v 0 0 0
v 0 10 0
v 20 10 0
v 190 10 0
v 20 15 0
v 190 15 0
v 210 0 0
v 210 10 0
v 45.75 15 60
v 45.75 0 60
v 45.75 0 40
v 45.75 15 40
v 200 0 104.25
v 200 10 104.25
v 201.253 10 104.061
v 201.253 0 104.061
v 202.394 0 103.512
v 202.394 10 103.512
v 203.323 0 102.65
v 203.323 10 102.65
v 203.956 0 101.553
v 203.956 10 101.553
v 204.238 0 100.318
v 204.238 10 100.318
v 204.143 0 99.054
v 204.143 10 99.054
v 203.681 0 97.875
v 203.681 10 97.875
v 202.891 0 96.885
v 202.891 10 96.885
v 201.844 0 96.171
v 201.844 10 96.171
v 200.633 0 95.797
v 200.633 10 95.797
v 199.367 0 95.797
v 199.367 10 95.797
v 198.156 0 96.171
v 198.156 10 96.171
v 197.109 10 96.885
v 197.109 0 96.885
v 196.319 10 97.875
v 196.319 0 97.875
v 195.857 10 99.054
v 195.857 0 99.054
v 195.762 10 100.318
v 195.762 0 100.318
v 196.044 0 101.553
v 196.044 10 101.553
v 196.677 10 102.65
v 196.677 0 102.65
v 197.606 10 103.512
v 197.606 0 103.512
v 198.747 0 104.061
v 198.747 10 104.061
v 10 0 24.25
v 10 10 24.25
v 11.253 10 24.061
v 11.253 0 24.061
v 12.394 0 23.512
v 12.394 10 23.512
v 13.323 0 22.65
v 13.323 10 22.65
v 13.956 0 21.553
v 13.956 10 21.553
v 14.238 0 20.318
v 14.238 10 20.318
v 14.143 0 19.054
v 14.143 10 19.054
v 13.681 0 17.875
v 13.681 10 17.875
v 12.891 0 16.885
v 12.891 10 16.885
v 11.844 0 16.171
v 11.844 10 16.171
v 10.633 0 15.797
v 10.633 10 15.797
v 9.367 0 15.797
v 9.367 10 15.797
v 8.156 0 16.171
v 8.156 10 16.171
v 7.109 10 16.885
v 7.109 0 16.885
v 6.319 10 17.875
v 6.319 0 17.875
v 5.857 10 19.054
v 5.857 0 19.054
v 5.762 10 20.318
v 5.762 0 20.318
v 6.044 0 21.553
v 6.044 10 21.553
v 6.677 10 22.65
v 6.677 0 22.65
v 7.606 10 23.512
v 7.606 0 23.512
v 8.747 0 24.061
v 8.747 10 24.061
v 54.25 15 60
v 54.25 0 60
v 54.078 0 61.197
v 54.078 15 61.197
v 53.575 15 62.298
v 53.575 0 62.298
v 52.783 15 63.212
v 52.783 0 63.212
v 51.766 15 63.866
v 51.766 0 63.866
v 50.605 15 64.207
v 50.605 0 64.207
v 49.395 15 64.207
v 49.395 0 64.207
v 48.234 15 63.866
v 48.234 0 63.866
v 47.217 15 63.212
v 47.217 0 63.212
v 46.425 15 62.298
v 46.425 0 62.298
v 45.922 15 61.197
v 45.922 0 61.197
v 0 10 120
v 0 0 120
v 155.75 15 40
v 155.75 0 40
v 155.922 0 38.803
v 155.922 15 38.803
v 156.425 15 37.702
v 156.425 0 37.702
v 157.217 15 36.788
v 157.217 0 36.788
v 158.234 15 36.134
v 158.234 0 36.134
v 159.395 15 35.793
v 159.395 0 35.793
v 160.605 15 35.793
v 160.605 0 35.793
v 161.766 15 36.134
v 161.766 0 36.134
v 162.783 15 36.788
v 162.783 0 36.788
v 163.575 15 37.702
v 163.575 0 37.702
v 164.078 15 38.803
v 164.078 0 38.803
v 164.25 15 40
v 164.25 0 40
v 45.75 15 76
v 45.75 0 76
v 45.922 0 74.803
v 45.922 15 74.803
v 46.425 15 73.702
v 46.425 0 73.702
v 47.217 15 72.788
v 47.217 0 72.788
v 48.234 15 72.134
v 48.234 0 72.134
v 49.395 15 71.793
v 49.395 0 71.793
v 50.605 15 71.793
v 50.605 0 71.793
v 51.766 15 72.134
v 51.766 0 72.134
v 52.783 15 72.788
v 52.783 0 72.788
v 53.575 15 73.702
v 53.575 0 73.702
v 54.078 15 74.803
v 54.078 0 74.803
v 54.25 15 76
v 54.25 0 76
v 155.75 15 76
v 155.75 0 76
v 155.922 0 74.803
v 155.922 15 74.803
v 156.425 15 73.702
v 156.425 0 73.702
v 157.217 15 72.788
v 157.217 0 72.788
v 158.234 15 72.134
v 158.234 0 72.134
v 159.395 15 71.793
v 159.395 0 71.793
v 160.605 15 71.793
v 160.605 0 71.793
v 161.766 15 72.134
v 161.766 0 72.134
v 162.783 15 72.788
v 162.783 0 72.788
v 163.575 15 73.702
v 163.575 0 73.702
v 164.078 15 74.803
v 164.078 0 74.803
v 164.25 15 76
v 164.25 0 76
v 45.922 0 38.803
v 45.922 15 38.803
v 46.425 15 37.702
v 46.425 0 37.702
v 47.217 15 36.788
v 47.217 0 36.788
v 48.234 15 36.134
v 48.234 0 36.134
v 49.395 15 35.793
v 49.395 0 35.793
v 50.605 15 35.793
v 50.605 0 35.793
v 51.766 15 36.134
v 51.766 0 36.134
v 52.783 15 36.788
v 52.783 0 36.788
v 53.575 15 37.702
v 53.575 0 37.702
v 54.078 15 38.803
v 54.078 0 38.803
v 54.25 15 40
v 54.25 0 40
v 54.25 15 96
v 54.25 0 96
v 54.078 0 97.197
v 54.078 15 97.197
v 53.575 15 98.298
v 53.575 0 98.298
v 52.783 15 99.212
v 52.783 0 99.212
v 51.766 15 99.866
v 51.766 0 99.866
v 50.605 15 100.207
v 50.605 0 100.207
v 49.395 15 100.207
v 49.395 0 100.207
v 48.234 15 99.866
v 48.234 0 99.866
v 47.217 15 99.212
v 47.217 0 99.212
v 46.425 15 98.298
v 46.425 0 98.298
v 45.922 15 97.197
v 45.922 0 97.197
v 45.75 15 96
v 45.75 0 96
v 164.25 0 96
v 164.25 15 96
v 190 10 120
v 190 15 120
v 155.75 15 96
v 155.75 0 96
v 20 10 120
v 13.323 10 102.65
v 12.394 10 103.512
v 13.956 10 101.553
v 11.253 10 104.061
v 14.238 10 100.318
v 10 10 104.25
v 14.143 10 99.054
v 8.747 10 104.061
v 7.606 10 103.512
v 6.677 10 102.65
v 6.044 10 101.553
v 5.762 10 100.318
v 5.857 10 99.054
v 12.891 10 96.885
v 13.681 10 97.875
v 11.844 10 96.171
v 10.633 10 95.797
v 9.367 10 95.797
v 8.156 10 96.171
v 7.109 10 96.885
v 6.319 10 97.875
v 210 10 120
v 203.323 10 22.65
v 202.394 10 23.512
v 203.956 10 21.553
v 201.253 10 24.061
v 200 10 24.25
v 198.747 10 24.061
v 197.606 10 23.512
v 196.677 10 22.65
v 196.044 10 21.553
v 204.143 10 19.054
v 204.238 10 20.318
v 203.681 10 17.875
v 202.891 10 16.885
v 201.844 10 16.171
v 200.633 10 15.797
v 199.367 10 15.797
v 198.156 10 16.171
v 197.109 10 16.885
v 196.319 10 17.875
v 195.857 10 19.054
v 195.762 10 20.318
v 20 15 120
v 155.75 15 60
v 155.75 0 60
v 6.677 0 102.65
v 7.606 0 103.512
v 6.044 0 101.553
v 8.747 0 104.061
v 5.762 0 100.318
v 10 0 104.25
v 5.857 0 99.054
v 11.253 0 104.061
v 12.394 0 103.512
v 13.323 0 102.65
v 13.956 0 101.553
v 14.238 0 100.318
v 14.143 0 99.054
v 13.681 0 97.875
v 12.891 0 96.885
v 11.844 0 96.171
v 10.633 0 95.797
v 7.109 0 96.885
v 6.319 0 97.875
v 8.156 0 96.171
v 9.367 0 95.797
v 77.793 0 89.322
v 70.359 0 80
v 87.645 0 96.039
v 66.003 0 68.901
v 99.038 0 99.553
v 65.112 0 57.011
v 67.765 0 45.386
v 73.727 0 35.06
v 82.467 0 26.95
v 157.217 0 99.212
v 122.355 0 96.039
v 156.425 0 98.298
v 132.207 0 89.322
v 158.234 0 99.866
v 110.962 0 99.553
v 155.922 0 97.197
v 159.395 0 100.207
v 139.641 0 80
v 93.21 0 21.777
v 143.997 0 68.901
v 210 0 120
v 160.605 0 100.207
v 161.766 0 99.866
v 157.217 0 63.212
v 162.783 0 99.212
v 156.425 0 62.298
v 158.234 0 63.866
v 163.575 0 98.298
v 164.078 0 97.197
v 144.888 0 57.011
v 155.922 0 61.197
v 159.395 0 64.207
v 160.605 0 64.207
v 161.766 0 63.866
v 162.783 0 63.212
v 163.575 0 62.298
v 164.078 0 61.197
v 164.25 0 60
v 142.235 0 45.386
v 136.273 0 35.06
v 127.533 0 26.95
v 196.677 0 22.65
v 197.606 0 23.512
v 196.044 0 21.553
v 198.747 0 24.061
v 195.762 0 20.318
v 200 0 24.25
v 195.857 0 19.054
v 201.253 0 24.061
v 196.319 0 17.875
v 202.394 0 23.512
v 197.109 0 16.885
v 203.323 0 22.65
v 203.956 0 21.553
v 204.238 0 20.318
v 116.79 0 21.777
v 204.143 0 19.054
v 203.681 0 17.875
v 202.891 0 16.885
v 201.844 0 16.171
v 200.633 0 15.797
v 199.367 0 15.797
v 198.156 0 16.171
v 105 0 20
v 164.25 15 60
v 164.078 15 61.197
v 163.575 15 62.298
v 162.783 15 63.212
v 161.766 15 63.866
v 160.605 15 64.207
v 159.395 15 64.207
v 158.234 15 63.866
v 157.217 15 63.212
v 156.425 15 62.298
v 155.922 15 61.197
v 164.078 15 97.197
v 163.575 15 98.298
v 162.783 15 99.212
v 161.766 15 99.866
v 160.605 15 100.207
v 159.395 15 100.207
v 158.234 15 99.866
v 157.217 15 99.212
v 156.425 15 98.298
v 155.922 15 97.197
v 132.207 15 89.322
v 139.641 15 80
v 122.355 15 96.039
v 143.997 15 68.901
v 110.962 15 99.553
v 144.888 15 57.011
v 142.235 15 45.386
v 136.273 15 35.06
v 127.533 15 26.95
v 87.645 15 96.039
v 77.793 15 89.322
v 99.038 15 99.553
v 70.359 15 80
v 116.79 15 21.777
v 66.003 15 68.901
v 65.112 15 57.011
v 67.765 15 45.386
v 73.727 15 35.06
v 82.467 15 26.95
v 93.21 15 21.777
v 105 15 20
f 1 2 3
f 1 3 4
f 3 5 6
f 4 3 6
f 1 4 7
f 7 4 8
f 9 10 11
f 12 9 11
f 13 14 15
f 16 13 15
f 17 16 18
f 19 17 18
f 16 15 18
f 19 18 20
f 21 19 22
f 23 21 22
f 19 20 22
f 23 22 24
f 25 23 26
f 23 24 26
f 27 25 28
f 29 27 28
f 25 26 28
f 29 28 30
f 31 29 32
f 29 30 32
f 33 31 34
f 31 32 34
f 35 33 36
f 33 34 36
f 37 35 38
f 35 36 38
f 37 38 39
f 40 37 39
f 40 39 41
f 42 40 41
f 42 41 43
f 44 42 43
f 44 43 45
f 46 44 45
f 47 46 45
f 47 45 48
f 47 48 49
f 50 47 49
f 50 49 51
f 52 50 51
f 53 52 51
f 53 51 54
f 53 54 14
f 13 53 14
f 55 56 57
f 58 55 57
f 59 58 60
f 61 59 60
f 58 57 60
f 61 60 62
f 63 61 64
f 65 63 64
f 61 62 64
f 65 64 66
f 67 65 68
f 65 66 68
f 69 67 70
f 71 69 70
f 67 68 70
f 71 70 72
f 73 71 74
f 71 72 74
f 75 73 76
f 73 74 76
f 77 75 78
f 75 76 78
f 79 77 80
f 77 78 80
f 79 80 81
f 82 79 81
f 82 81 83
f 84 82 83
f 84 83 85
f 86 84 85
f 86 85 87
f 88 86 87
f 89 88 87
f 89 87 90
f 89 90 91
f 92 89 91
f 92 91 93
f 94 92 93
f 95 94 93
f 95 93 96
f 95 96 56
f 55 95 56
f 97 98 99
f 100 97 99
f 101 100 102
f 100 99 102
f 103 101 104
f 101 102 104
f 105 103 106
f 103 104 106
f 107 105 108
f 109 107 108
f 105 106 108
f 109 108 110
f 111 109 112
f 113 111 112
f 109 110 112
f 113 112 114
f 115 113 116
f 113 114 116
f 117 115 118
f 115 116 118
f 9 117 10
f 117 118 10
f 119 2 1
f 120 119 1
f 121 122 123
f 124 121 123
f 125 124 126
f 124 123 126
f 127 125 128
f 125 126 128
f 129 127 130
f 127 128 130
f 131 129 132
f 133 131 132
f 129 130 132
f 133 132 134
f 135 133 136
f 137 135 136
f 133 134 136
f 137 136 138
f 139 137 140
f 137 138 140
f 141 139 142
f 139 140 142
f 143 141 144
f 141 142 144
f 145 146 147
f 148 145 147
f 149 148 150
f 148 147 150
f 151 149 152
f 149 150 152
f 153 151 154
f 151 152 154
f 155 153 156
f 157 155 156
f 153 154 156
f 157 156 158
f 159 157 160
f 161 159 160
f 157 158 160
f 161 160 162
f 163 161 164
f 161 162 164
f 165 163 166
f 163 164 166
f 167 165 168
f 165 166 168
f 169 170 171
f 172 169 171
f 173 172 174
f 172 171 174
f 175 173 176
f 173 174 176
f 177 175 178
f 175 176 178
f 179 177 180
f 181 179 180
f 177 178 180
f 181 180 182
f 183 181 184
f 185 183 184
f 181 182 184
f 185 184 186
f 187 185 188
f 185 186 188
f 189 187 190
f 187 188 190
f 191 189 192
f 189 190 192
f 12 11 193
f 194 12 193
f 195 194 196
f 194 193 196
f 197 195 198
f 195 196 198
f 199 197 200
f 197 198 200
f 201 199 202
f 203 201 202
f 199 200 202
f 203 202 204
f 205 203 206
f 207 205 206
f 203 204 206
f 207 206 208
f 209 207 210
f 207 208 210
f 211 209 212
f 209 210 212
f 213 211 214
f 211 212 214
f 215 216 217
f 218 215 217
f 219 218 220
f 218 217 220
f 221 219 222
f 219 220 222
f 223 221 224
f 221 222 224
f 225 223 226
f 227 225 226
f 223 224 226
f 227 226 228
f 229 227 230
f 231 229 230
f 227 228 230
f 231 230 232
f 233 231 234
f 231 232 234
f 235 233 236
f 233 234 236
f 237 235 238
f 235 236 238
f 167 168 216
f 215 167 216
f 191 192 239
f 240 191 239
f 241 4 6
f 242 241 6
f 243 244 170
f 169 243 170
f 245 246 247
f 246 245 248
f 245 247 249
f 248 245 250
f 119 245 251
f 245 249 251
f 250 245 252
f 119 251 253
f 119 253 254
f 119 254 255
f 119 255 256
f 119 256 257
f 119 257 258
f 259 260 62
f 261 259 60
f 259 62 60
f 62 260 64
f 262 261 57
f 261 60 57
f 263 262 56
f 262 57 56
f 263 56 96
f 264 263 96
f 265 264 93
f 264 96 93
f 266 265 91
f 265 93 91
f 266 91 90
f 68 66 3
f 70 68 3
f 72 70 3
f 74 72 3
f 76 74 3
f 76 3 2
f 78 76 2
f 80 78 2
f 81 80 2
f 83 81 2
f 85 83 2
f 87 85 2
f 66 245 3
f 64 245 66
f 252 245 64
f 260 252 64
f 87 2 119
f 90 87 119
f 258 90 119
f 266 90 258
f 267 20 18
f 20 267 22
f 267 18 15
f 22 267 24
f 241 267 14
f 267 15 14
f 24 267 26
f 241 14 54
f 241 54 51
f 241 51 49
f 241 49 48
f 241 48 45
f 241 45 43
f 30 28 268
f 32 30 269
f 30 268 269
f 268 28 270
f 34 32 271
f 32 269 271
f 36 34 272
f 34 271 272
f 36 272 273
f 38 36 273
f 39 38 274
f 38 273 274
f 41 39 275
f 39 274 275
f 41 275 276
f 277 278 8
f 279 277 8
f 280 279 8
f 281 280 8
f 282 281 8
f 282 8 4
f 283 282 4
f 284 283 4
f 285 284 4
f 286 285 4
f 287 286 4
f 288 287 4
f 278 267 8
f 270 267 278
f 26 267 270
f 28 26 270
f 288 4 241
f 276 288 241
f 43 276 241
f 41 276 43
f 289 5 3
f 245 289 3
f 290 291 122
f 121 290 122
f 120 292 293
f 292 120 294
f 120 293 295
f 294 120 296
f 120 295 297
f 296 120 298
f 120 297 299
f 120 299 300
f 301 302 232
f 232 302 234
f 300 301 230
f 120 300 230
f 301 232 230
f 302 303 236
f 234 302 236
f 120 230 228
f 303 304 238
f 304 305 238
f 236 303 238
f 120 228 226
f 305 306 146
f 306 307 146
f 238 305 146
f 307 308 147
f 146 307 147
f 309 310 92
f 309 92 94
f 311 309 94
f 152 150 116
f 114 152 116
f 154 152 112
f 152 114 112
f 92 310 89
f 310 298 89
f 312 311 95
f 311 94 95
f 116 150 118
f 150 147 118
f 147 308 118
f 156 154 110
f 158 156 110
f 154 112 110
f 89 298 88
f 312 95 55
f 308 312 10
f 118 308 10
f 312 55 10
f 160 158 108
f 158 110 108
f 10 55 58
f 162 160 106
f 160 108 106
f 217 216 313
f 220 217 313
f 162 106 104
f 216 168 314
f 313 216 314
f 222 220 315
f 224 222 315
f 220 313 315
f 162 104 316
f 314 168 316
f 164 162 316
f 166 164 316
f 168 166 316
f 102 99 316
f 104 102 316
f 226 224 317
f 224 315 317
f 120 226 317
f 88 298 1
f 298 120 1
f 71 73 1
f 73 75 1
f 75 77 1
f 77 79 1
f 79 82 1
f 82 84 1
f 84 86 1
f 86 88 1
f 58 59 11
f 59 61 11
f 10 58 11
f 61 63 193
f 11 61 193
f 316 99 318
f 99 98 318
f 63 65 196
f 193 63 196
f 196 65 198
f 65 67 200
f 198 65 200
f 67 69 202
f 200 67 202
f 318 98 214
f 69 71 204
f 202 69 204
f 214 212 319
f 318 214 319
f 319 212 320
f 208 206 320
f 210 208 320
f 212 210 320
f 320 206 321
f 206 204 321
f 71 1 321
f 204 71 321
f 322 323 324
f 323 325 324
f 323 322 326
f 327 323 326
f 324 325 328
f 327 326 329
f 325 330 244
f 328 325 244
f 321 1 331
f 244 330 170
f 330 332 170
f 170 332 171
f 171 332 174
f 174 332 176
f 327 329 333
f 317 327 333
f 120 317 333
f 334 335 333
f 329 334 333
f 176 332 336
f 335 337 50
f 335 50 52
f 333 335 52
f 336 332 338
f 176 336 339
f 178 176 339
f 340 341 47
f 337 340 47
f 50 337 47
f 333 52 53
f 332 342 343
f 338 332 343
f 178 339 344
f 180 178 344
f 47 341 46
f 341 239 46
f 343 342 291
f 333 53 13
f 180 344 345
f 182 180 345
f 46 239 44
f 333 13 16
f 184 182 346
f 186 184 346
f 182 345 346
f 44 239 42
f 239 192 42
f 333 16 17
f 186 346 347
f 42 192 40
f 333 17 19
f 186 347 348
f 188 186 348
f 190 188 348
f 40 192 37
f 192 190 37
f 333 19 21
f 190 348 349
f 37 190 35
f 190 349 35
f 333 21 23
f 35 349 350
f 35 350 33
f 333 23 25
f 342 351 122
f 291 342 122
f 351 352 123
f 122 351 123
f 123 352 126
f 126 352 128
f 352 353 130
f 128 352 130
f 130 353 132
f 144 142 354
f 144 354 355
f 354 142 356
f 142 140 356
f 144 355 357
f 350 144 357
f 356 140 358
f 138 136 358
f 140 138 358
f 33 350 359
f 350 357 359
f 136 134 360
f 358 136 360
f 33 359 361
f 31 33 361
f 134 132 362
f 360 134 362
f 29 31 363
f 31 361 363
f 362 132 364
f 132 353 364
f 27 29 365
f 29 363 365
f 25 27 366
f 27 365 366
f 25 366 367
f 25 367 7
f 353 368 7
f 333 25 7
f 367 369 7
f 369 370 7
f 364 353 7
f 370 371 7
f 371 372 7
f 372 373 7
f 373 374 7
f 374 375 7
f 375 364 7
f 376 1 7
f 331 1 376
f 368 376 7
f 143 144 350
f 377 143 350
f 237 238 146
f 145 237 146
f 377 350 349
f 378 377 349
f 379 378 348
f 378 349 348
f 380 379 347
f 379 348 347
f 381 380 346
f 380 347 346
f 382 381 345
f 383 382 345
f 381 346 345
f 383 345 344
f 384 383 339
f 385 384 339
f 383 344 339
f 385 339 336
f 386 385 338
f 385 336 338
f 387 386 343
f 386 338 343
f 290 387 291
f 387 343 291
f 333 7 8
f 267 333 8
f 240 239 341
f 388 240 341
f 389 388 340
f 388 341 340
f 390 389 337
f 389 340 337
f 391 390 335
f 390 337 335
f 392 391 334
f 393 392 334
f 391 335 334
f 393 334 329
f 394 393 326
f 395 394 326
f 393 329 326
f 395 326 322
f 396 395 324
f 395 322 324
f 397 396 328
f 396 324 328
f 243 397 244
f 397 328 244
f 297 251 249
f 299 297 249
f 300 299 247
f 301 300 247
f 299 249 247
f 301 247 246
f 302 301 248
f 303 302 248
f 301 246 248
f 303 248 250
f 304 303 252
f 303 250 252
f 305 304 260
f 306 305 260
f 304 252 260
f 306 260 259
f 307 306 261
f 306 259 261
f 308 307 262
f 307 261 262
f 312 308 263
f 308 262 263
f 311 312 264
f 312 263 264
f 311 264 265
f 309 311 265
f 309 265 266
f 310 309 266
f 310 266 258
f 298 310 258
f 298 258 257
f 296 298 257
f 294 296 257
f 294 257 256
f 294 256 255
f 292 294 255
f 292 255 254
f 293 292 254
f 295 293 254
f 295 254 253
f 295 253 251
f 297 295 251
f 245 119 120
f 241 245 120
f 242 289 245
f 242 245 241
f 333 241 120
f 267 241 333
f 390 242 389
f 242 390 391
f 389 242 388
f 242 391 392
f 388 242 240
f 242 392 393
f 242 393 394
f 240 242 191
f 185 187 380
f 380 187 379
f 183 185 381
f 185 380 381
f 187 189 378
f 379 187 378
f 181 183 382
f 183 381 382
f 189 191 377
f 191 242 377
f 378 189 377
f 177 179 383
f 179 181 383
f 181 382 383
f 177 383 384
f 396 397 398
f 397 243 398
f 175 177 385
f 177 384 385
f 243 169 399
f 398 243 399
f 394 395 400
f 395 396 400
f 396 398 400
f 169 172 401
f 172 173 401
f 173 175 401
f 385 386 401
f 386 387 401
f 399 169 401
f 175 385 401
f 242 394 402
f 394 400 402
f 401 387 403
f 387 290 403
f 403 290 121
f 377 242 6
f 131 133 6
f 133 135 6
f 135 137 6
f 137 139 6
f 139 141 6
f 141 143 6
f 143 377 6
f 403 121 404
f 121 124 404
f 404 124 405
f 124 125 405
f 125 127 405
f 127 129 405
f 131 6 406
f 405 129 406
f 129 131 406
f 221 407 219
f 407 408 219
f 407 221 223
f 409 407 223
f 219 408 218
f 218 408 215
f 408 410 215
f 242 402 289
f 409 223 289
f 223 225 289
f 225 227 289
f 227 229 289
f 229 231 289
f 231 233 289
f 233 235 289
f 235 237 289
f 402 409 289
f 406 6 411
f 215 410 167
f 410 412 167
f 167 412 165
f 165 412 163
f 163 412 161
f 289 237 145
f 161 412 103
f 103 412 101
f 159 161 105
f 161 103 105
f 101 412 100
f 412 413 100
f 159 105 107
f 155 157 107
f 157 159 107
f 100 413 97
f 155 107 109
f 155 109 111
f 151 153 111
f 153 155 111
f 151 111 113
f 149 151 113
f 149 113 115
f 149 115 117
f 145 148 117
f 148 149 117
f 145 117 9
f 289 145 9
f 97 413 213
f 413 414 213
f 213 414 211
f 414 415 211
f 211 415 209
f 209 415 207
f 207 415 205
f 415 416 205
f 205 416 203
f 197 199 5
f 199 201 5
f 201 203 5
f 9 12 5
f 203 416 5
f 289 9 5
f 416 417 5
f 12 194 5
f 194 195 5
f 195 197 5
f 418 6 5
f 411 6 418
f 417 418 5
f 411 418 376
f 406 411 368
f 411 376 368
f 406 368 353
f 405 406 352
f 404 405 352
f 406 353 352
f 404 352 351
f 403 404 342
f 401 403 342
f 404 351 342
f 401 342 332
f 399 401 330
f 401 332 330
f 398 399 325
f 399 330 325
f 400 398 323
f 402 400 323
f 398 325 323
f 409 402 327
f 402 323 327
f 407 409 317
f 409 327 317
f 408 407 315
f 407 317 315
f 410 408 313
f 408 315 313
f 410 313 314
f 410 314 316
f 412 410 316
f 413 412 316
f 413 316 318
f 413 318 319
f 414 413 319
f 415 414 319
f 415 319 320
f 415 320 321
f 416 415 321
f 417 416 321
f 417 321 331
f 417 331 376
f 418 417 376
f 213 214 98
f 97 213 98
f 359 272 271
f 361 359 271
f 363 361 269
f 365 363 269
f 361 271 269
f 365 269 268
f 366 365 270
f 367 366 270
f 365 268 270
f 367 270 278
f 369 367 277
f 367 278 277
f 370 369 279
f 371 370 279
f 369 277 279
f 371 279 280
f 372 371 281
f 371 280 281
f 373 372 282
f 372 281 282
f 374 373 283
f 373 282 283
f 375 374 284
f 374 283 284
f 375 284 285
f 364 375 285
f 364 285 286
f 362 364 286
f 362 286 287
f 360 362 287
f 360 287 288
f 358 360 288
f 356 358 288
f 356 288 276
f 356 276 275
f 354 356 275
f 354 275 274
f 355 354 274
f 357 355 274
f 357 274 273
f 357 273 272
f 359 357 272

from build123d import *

# Parameters (mm, degrees)
EXTRUDE_1_DEPTH             = 120
HOLE_WIZARD_8_5_8_5_1_D     = 8.5
PATTERN_LINEAR_1_COUNT      = 2
PATTERN_LINEAR_1_PITCH      = 190
PATTERN_LINEAR_1_COUNT_DIR2 = 2
PATTERN_LINEAR_1_PITCH_DIR2 = 80
CUT_EXTRUDE_2_REACH         = 244.332
SKETCH_3_R                  = 40


with BuildPart() as part:
    # 草图1 → 拉伸1 (new body)
    with BuildSketch(Plane.XY):
        Polygon((0, 0), (210, 0), (210, 10), (190, 10), (190, 15), (20, 15), (20, 10), (0, 10), align=None)
    extrude(amount=EXTRUDE_1_DEPTH)

    # Ø8.5 (8.5) 直径孔1 (through all)
    with Locations(Plane(origin=(10, 0, 20), x_dir=(0, 0, -1), z_dir=(0, -1, 0))):
        with Locations((0, 0)):
            hole_wizard_8_5_8_5_1 = Hole(HOLE_WIZARD_8_5_8_5_1_D / 2)

    # 阵列(线性)1: Hole Wizard 8.5 _8.5_ _1 2 × 2
    with Locations(*[(i * PATTERN_LINEAR_1_PITCH, 0, j * PATTERN_LINEAR_1_PITCH_DIR2) for i in range(PATTERN_LINEAR_1_COUNT) for j in range(PATTERN_LINEAR_1_COUNT_DIR2) if (i, j) != (0, 0)]):
        add(hole_wizard_8_5_8_5_1, mode=Mode.SUBTRACT)

    # 草图3 → 拉伸2 (cut, up to next)
    with BuildSketch(Plane.XZ, mode=Mode.PRIVATE) as cut_extrude_2_sk1:
        with Locations(Location((105, 60, 0), (0, 0, 270))):
            Circle(SKETCH_3_R)
    cut_extrude_2_tool1 = extrude(cut_extrude_2_sk1.sketch, amount=-CUT_EXTRUDE_2_REACH, mode=Mode.PRIVATE) & part.part
    # 草图3 → 拉伸2 (cut, up to next)
    with BuildSketch(Plane.XZ, mode=Mode.PRIVATE) as cut_extrude_2_sk2:
        with BuildLine():
            Line((45.75, 96), (45.75, 76))
            ThreePointArc((45.75, 76), (50, 71.75), (54.25, 76))
            Line((54.25, 76), (54.25, 96))
            ThreePointArc((54.25, 96), (50, 100.25), (45.75, 96))
        make_face()
    cut_extrude_2_tool2 = extrude(cut_extrude_2_sk2.sketch, amount=-CUT_EXTRUDE_2_REACH, mode=Mode.PRIVATE) & part.part
    # 草图3 → 拉伸2 (cut, up to next)
    with BuildSketch(Plane.XZ, mode=Mode.PRIVATE) as cut_extrude_2_sk3:
        with BuildLine():
            Line((155.75, 96), (155.75, 76))
            ThreePointArc((155.75, 76), (160, 71.75), (164.25, 76))
            Line((164.25, 76), (164.25, 96))
            ThreePointArc((164.25, 96), (160, 100.25), (155.75, 96))
        make_face()
    cut_extrude_2_tool3 = extrude(cut_extrude_2_sk3.sketch, amount=-CUT_EXTRUDE_2_REACH, mode=Mode.PRIVATE) & part.part
    # 草图3 → 拉伸2 (cut, up to next)
    with BuildSketch(Plane.XZ, mode=Mode.PRIVATE) as cut_extrude_2_sk4:
        with BuildLine():
            Line((45.75, 60), (45.75, 40))
            ThreePointArc((45.75, 40), (50, 35.75), (54.25, 40))
            Line((54.25, 40), (54.25, 60))
            ThreePointArc((54.25, 60), (50, 64.25), (45.75, 60))
        make_face()
    cut_extrude_2_tool4 = extrude(cut_extrude_2_sk4.sketch, amount=-CUT_EXTRUDE_2_REACH, mode=Mode.PRIVATE) & part.part
    # 草图3 → 拉伸2 (cut, up to next)
    with BuildSketch(Plane.XZ, mode=Mode.PRIVATE) as cut_extrude_2_sk5:
        with BuildLine():
            Line((155.75, 60), (155.75, 40))
            ThreePointArc((155.75, 40), (160, 35.75), (164.25, 40))
            Line((164.25, 40), (164.25, 60))
            ThreePointArc((164.25, 60), (160, 64.25), (155.75, 60))
        make_face()
    cut_extrude_2_tool5 = extrude(cut_extrude_2_sk5.sketch, amount=-CUT_EXTRUDE_2_REACH, mode=Mode.PRIVATE) & part.part
    add(cut_extrude_2_tool1.solids().sort_by_distance((105, 0, 60))[0], mode=Mode.SUBTRACT)
    add(cut_extrude_2_tool2.solids().sort_by_distance((50, 0, 86))[0], mode=Mode.SUBTRACT)
    add(cut_extrude_2_tool3.solids().sort_by_distance((160, 0, 86))[0], mode=Mode.SUBTRACT)
    add(cut_extrude_2_tool4.solids().sort_by_distance((50, 0, 50))[0], mode=Mode.SUBTRACT)
    add(cut_extrude_2_tool5.solids().sort_by_distance((160, 0, 50))[0], mode=Mode.SUBTRACT)


solid = part.part
